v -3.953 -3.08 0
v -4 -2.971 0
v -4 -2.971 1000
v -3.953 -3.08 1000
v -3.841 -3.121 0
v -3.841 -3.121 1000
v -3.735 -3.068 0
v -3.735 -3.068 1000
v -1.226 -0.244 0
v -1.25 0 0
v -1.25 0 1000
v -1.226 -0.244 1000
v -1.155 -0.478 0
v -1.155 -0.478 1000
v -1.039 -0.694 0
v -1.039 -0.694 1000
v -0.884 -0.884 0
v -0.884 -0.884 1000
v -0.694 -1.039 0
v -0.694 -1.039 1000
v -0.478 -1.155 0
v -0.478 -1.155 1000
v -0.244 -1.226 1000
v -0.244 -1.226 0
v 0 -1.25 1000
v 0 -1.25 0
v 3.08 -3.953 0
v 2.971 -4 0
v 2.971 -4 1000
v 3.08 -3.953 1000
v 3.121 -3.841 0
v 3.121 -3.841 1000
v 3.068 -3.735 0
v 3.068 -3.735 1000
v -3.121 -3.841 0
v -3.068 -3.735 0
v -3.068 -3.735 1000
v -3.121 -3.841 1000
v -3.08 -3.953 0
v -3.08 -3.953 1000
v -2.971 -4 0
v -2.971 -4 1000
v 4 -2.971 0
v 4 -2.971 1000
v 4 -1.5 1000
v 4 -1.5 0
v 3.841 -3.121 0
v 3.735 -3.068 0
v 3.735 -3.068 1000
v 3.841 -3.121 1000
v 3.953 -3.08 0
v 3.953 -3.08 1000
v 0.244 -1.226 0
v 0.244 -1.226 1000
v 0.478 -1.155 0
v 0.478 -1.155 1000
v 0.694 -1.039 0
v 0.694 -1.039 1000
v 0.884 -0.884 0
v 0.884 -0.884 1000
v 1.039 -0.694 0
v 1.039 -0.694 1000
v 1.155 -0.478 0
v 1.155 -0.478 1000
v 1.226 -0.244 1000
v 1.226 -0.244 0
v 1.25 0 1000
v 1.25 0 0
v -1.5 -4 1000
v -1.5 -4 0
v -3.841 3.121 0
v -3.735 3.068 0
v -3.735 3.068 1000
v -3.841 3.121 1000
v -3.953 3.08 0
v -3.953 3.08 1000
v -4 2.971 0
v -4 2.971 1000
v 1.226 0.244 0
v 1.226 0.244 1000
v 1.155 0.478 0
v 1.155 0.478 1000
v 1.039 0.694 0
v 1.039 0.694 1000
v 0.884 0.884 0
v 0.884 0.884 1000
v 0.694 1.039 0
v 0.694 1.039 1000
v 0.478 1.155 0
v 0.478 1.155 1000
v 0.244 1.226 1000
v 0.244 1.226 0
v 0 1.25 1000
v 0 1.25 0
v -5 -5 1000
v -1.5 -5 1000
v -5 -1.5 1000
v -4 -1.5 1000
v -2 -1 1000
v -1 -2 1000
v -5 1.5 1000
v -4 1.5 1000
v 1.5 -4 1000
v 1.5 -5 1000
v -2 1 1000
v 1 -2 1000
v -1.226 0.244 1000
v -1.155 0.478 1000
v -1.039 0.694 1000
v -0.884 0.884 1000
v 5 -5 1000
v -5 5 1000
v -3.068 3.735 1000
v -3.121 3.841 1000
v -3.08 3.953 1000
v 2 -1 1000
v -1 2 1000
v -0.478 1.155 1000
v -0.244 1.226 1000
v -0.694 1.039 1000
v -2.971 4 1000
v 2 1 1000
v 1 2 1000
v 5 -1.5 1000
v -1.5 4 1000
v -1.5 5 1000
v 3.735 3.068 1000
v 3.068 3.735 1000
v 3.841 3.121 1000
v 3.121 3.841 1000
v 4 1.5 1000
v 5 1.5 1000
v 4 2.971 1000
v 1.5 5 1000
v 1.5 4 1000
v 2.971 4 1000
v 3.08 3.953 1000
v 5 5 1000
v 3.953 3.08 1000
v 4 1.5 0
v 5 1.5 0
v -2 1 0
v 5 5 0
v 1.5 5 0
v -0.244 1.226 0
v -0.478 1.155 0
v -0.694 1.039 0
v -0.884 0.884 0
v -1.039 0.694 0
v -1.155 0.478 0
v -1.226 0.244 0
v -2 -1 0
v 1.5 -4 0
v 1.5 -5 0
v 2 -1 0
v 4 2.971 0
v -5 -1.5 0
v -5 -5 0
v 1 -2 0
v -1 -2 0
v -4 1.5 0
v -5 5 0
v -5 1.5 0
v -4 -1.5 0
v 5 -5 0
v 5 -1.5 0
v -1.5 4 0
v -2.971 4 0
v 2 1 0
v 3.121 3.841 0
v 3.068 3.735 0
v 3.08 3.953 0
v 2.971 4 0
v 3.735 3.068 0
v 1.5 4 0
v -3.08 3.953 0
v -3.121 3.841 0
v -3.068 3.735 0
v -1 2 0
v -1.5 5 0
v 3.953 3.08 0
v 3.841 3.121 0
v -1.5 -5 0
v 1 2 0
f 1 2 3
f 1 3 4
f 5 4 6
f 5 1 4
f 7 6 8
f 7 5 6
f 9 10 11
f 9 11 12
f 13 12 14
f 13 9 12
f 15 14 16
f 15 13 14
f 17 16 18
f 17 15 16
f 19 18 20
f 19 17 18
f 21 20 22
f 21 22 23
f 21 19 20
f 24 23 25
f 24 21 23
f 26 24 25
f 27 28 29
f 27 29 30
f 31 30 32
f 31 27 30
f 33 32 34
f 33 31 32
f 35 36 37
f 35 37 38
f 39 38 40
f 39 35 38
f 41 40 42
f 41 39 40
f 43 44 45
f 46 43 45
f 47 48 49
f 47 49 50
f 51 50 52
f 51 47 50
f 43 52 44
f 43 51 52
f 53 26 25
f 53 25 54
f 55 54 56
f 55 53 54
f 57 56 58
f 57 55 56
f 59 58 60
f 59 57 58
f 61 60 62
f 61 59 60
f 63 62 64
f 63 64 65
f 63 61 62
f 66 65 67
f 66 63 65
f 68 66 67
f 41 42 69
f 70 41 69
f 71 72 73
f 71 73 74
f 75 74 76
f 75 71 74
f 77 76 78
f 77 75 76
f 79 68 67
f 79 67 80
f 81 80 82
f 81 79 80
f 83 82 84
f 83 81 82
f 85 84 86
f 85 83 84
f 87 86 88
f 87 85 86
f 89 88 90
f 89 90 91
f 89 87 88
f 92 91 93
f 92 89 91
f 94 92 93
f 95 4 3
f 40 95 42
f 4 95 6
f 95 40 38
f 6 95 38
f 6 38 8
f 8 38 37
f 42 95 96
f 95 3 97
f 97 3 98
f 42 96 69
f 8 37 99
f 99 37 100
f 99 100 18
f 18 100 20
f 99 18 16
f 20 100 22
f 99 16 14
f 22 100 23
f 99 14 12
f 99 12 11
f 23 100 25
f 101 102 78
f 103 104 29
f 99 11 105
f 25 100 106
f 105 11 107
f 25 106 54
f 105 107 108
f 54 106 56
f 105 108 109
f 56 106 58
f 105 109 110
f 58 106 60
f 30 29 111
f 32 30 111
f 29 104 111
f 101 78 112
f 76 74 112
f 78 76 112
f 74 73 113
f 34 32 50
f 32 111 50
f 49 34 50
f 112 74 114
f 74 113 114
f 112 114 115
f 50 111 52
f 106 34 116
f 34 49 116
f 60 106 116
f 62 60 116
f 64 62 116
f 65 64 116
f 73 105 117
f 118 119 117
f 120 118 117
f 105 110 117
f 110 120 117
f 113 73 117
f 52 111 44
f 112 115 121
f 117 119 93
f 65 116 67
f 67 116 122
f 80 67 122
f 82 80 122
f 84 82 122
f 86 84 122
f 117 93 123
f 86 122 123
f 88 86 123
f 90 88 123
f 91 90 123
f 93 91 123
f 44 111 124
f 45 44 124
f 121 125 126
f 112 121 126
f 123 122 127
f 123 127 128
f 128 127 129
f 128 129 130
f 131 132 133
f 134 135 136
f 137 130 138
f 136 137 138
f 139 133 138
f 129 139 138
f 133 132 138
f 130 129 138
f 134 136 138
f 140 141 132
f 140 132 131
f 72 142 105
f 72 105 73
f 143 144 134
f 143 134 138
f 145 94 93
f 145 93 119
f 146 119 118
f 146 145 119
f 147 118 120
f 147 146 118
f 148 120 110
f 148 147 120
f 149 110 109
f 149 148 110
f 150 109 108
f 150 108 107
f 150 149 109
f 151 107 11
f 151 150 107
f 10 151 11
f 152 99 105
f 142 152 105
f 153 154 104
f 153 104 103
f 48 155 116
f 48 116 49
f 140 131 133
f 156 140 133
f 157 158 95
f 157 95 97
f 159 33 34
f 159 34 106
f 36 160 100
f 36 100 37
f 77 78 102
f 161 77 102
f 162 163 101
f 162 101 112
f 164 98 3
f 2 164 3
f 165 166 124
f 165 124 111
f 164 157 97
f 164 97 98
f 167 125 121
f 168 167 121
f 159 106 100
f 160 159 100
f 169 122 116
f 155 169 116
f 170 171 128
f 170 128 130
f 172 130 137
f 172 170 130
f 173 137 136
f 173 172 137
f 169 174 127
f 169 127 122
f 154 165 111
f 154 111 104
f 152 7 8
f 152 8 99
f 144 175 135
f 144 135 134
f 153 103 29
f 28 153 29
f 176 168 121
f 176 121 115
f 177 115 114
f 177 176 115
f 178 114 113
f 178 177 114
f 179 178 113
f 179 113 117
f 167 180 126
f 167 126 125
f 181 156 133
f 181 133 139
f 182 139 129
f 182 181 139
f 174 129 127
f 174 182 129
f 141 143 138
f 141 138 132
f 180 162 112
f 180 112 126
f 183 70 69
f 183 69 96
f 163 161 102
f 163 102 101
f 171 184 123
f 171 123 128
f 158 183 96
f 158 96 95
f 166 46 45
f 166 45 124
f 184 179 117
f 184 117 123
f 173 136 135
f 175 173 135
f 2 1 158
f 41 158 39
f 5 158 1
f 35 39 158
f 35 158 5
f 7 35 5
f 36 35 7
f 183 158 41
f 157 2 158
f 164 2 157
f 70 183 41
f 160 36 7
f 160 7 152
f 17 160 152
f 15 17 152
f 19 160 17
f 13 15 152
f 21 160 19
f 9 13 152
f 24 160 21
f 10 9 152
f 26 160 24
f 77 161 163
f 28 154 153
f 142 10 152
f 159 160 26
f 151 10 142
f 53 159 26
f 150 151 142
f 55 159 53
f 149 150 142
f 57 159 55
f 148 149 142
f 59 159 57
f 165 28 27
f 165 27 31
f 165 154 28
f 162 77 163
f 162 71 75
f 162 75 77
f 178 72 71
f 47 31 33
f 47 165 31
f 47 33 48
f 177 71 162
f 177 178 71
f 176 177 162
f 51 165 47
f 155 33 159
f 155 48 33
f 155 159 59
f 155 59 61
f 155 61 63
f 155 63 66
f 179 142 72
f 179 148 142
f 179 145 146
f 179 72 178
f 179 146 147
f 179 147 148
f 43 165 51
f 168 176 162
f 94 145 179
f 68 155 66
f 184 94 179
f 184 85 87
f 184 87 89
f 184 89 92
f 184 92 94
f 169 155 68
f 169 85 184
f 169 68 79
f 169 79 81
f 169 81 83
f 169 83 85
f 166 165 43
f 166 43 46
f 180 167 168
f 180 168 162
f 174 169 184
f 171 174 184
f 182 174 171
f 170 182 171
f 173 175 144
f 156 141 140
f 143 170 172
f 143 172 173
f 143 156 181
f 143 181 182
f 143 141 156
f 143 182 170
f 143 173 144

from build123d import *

# Parameters (mm, degrees)
BOSS_EXTRU_1_DEPTH           = 1000
R_P_TITION_CIRCULAIRE1_COUNT = 4


with BuildPart() as part:
    # Esquisse1 → Boss.-Extru.1 (new body)
    with BuildSketch(Plane.XY):
        with BuildLine():
            Line((0, 2), (0, 1.25))
            ThreePointArc((0, 1.25), (-0.883883476, 0.883883476), (-1.25, 0))
            Line((-1.25, 0), (-2, 0))
            Line((-2, 0), (-2, 1))
            Line((-2, 1), (-3.735093334, 3.067803714))
            ThreePointArc((-3.735093334, 3.067803714), (-3.901303021, 3.112339465), (-4, 2.971385572))
            Line((-4, 2.971385572), (-4, 1.5))
            Line((-4, 1.5), (-5, 1.5))
            Line((-5, 1.5), (-5, 5))
            Line((-5, 5), (-1.5, 5))
            Line((-1.5, 5), (-1.5, 4))
            Line((-1.5, 4), (-2.971385572, 4))
            ThreePointArc((-2.971385572, 4), (-3.112339465, 3.901303021), (-3.067803714, 3.735093334))
            Line((-3.067803714, 3.735093334), (-1, 2))
            Line((-1, 2), (0, 2))
        make_face()
    boss_extru_1 = extrude(amount=BOSS_EXTRU_1_DEPTH)

    # Répétition circulaire1: Boss.-Extru.1 ×4 about axis
    r_p_tition_circulaire1_axis = Axis((0, 0, 105), (0, 0, -1))
    for i in range(1, R_P_TITION_CIRCULAIRE1_COUNT):
        add(boss_extru_1.rotate(r_p_tition_circulaire1_axis, i * 360 / R_P_TITION_CIRCULAIRE1_COUNT))


solid = part.part
